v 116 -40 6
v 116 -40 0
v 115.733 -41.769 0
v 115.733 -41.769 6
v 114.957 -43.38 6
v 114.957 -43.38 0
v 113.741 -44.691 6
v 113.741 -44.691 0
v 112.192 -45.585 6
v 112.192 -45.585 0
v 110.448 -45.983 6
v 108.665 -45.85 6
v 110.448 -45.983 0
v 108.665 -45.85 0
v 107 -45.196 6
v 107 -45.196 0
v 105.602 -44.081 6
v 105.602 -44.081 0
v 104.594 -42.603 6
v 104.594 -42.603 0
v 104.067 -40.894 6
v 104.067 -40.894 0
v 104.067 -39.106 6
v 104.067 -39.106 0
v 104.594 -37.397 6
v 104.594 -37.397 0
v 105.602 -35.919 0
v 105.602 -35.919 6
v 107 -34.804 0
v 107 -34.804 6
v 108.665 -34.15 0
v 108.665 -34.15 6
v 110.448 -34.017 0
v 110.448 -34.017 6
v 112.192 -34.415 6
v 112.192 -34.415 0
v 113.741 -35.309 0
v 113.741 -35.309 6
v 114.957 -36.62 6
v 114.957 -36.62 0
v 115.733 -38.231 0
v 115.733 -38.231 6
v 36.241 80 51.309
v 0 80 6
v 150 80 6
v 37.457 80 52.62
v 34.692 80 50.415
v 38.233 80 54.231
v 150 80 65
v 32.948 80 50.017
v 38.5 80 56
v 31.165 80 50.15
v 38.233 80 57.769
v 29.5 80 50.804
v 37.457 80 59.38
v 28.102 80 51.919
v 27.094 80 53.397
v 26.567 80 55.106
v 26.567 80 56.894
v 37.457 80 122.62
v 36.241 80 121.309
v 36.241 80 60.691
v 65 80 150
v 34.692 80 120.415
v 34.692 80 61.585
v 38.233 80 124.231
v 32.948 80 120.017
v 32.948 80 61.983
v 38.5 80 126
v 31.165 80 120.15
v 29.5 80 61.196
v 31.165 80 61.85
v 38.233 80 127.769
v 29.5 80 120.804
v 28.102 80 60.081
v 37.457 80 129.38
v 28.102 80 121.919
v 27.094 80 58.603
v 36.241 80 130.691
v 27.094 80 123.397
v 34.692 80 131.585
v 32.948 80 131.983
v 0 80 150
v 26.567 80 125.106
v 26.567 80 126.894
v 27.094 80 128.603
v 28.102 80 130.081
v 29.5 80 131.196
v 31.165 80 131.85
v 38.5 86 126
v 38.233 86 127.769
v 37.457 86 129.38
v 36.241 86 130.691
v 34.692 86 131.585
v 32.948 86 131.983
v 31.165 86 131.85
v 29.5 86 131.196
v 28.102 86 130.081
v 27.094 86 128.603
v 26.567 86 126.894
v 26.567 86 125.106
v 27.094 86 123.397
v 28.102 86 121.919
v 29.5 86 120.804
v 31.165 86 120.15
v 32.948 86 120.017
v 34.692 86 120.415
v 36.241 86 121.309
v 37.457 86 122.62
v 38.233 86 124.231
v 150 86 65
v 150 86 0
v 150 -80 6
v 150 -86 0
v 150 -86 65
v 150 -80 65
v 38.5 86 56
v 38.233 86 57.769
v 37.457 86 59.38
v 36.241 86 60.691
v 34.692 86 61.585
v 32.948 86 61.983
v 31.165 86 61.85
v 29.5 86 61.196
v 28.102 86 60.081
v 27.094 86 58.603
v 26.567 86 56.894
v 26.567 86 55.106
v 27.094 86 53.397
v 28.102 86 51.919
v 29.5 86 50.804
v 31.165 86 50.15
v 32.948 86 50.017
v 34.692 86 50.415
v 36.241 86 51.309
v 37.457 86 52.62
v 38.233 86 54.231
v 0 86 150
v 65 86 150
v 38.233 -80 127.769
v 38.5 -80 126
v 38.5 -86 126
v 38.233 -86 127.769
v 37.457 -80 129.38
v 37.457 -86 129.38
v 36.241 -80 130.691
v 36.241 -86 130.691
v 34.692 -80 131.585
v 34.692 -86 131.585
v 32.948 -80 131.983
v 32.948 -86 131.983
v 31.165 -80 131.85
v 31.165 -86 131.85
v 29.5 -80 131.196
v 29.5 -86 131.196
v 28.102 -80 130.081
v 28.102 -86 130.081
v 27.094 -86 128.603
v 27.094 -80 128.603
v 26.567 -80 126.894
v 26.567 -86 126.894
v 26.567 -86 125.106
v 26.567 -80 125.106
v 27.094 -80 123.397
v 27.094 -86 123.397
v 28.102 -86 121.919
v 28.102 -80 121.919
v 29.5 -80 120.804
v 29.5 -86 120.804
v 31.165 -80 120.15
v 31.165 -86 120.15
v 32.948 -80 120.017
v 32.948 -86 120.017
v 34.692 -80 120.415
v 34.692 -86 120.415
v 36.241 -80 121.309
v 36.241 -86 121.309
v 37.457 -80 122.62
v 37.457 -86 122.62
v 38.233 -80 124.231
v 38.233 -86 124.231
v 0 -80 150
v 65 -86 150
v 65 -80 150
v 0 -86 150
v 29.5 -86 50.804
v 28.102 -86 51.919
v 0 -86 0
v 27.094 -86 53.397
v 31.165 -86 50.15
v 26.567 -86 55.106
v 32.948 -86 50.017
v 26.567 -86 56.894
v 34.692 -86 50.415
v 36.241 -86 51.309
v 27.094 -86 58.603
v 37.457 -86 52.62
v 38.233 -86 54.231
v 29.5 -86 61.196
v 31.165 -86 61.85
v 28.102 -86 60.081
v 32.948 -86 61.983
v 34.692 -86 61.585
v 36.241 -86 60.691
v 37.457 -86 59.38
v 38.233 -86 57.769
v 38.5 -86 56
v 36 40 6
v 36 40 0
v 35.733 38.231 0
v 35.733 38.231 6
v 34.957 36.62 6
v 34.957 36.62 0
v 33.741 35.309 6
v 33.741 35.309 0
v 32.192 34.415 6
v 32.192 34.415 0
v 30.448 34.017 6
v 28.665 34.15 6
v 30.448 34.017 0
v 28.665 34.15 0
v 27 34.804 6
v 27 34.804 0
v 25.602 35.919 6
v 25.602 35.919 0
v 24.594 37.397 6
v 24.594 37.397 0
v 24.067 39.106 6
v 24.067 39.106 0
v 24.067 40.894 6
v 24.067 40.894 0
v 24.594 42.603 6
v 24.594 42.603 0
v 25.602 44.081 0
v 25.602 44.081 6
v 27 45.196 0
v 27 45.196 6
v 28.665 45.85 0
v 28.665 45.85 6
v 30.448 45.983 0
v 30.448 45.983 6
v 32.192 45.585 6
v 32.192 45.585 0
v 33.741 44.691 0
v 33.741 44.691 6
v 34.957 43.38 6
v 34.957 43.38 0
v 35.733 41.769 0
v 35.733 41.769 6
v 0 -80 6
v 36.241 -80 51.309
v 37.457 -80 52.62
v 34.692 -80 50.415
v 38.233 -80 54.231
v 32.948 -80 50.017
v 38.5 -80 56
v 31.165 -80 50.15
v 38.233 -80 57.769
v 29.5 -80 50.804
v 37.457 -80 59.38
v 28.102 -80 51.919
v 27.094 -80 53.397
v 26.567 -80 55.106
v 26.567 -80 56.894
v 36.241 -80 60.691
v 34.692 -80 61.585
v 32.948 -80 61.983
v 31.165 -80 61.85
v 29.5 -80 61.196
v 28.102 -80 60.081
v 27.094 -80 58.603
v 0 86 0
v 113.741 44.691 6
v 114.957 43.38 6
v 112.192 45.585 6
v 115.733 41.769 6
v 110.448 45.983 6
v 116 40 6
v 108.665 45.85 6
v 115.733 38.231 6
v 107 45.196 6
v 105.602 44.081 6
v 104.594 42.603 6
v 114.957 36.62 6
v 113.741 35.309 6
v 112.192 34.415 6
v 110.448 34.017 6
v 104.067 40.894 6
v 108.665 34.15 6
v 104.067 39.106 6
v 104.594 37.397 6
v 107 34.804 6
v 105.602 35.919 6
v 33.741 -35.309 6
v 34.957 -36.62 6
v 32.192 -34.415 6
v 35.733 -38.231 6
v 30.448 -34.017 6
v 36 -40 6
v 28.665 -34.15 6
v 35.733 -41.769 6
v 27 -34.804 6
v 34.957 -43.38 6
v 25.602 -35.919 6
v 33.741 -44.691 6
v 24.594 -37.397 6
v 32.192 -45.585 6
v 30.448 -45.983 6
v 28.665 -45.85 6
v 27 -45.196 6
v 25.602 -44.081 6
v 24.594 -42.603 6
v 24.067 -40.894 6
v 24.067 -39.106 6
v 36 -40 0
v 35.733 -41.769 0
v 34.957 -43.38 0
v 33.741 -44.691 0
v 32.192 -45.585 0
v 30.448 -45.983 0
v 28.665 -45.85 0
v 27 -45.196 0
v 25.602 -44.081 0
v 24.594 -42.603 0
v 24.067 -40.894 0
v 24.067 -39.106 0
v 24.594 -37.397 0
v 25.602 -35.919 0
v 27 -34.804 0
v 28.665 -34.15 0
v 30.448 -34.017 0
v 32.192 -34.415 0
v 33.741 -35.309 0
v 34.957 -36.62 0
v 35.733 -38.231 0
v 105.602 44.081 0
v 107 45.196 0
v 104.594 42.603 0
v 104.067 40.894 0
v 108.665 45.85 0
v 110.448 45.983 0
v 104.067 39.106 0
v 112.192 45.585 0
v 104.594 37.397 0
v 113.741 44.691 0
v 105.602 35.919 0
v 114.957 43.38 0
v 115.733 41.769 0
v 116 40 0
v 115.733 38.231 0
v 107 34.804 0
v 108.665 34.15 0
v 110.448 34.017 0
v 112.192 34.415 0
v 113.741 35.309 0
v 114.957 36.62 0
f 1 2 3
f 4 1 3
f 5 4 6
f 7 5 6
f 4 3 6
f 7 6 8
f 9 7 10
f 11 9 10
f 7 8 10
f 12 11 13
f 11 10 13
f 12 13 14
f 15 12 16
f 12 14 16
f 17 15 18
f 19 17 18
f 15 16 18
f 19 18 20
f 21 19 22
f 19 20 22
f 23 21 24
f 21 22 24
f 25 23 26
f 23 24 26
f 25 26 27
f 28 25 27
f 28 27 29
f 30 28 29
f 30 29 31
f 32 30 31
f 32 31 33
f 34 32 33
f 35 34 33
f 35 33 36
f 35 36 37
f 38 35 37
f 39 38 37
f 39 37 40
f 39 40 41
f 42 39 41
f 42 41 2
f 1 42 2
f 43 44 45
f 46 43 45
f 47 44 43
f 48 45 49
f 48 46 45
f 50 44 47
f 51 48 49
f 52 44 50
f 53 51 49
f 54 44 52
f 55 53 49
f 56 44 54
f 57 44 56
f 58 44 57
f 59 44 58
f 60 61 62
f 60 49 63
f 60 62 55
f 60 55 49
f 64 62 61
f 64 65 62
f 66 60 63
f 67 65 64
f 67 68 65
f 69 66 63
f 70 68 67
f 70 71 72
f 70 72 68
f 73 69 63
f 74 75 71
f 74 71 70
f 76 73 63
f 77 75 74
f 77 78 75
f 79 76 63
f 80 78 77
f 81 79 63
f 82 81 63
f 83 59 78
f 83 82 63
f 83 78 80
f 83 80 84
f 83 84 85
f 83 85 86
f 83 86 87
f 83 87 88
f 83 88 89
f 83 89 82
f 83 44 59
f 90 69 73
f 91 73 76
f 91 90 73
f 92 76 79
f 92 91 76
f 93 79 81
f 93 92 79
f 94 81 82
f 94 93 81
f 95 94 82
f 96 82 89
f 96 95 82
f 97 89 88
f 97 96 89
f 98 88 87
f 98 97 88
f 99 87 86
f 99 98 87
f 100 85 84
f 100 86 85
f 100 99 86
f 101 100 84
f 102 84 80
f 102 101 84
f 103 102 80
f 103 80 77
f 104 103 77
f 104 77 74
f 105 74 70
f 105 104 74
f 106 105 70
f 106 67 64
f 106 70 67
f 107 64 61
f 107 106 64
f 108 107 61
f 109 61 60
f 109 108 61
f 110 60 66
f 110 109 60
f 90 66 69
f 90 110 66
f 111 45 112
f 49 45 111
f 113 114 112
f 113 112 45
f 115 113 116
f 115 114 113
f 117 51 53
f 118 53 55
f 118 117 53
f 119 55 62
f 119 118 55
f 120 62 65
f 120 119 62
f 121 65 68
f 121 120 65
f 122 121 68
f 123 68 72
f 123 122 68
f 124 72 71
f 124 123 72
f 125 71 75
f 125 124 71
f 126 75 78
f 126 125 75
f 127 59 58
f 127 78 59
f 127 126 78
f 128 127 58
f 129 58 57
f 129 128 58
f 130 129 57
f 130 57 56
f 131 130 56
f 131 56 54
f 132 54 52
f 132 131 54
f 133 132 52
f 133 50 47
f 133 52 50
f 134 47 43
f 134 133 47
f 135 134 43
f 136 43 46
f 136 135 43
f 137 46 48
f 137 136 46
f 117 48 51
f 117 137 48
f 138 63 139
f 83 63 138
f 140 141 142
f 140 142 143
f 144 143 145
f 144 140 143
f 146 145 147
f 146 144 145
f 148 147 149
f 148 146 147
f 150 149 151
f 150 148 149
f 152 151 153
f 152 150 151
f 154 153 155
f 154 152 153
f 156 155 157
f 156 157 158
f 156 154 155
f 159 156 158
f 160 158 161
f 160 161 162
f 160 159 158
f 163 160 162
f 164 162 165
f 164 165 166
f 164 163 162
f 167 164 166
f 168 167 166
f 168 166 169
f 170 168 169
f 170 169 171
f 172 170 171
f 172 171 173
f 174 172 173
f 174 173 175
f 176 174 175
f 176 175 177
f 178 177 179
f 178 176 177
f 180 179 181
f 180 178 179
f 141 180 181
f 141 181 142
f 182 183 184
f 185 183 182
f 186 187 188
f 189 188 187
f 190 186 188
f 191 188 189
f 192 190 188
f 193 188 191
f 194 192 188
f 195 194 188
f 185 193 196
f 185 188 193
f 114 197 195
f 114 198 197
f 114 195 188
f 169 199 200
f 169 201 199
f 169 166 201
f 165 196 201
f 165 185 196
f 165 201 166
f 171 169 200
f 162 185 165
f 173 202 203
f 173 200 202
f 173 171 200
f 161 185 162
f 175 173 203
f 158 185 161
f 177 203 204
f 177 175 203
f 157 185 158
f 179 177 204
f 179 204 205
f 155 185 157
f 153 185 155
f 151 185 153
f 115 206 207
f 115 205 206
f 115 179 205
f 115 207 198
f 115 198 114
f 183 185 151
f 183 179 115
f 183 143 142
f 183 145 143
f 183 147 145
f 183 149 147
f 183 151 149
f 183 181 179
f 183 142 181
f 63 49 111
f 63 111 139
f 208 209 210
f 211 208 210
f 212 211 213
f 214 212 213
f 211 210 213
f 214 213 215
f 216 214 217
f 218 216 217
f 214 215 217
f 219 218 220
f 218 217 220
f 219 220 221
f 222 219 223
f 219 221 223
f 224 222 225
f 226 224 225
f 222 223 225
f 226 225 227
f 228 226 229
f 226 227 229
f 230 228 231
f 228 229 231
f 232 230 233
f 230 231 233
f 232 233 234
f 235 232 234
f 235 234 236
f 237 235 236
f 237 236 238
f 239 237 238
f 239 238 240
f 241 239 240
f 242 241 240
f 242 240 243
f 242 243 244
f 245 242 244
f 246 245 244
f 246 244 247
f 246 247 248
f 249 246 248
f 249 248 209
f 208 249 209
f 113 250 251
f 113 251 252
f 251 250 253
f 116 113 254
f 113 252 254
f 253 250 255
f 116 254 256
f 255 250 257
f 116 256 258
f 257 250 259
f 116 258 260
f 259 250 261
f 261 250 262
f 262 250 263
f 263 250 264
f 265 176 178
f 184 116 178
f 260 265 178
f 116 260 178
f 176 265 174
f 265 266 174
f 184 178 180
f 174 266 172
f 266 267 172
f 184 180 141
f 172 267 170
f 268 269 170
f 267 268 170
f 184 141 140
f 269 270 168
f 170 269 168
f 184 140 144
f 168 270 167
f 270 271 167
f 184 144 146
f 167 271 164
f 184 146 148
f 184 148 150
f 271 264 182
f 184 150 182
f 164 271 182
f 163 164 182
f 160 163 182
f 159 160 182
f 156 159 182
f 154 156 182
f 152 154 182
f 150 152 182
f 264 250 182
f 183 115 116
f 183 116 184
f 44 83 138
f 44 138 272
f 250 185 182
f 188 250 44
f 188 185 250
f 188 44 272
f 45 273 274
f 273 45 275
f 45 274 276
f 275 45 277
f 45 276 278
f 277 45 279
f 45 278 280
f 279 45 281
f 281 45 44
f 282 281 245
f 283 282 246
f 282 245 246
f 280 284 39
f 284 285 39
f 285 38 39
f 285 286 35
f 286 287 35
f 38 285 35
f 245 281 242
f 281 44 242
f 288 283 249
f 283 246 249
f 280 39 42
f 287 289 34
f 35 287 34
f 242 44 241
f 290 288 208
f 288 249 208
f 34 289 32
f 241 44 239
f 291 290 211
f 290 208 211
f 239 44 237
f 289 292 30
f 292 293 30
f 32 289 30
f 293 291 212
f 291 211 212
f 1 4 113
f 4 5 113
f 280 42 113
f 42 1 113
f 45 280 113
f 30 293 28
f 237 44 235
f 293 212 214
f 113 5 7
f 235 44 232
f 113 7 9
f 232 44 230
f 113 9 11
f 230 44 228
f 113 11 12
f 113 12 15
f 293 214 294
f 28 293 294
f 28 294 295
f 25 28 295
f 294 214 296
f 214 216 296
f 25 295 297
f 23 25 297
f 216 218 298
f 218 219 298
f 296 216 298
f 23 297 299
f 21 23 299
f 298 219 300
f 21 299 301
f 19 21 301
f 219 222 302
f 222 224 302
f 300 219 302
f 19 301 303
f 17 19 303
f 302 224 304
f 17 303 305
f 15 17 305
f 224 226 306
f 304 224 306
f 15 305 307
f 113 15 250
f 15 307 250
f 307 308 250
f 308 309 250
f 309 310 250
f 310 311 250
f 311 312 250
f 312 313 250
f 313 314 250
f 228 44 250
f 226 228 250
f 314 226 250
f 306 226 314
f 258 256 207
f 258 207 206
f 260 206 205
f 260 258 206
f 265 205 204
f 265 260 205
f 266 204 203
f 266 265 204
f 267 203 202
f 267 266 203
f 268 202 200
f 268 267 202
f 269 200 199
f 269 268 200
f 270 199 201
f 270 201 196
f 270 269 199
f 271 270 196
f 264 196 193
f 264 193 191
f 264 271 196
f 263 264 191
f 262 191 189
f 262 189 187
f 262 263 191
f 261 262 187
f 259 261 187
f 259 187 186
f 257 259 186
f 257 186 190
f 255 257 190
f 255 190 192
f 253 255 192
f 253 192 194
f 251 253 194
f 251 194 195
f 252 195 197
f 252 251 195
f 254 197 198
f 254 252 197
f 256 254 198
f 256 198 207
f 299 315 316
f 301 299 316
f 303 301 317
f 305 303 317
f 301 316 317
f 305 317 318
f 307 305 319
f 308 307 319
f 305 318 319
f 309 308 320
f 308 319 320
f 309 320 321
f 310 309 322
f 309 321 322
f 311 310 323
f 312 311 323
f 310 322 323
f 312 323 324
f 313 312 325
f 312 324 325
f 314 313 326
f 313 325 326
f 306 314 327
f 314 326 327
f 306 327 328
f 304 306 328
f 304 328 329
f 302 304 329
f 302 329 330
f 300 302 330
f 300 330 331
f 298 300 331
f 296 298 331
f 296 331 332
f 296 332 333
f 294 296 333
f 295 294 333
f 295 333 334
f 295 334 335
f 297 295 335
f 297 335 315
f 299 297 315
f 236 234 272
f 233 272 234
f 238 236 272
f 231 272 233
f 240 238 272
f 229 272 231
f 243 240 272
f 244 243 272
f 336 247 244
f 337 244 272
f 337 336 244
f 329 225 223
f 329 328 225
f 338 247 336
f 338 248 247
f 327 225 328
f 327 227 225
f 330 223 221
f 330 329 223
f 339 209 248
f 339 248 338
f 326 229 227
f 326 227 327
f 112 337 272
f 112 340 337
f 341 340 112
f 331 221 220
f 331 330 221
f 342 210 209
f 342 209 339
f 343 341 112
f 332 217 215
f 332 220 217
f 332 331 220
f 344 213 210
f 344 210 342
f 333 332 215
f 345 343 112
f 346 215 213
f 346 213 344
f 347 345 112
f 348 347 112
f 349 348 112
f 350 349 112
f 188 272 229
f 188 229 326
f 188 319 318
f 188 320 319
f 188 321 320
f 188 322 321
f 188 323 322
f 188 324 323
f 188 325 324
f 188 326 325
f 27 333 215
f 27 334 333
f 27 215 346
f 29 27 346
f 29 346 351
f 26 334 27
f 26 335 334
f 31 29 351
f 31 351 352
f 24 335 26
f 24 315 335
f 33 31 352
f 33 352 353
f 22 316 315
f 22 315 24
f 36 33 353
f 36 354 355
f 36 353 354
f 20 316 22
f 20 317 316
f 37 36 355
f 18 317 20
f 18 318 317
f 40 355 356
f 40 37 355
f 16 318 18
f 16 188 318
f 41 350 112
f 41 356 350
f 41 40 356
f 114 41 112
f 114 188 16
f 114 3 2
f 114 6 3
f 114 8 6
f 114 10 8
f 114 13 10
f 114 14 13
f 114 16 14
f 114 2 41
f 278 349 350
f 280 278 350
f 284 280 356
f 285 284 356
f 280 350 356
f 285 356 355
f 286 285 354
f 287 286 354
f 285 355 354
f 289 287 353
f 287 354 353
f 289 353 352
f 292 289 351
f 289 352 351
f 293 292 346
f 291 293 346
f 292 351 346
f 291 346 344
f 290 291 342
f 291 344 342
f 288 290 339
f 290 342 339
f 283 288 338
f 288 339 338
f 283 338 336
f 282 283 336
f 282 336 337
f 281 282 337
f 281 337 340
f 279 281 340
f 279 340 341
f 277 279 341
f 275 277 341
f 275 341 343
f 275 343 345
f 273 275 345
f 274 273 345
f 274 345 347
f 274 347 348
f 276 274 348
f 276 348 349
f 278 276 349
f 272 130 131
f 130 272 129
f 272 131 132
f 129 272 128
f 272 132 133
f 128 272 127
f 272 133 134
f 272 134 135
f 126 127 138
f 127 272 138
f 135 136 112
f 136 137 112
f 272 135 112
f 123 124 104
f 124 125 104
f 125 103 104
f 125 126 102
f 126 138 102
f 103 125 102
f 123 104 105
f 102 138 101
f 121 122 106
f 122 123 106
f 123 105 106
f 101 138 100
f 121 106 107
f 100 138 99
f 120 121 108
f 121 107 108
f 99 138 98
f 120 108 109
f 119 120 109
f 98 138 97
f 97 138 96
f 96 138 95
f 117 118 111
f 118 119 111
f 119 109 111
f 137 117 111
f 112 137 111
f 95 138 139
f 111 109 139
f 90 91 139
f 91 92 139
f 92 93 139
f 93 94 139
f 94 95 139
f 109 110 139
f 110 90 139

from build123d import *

# Parameters (mm, degrees)
F0_R     = 6
F1_DEPTH = 86
F2_W     = 160
F2_H     = 144
F3_DEPTH = 150.001
F4_R     = 6
F5_DEPTH = 150.001


with BuildPart() as f1:
    # F0 (on Front) → F1 (new body, symmetric)
    with BuildSketch(Plane.XZ):
        Polygon((0, 150), (0, 0), (150, 0), (150, 65), (65, 150), align=None)
        with Locations((32.5, 56)):
            Circle(F0_R, mode=Mode.SUBTRACT)
        with Locations((32.5, 126)):
            Circle(F0_R, mode=Mode.SUBTRACT)
    extrude(amount=F1_DEPTH, both=True)

    # F2 (on face) → F3 (cut, through all)
    with BuildSketch(Plane(origin=(0, 0, 0), x_dir=(0, -1, 0), z_dir=(-1, 0, 0))):
        with Locations((0, 78)):
            Rectangle(F2_W, F2_H)
    extrude(amount=-F3_DEPTH, mode=Mode.SUBTRACT)

    # F4 (on face) → F5 (cut, through all)
    with BuildSketch(Plane(origin=(0, 0, 0), x_dir=(1, 0, 0), z_dir=(0, 0, -1))):
        with Locations((110, 40)):
            Circle(F4_R)
        with Locations((110, -40)):
            Circle(F4_R)
        with Locations((30, 40)):
            Circle(F4_R)
        with Locations((30, -40)):
            Circle(F4_R)
    extrude(amount=-F5_DEPTH, mode=Mode.SUBTRACT)


solid = f1.part
